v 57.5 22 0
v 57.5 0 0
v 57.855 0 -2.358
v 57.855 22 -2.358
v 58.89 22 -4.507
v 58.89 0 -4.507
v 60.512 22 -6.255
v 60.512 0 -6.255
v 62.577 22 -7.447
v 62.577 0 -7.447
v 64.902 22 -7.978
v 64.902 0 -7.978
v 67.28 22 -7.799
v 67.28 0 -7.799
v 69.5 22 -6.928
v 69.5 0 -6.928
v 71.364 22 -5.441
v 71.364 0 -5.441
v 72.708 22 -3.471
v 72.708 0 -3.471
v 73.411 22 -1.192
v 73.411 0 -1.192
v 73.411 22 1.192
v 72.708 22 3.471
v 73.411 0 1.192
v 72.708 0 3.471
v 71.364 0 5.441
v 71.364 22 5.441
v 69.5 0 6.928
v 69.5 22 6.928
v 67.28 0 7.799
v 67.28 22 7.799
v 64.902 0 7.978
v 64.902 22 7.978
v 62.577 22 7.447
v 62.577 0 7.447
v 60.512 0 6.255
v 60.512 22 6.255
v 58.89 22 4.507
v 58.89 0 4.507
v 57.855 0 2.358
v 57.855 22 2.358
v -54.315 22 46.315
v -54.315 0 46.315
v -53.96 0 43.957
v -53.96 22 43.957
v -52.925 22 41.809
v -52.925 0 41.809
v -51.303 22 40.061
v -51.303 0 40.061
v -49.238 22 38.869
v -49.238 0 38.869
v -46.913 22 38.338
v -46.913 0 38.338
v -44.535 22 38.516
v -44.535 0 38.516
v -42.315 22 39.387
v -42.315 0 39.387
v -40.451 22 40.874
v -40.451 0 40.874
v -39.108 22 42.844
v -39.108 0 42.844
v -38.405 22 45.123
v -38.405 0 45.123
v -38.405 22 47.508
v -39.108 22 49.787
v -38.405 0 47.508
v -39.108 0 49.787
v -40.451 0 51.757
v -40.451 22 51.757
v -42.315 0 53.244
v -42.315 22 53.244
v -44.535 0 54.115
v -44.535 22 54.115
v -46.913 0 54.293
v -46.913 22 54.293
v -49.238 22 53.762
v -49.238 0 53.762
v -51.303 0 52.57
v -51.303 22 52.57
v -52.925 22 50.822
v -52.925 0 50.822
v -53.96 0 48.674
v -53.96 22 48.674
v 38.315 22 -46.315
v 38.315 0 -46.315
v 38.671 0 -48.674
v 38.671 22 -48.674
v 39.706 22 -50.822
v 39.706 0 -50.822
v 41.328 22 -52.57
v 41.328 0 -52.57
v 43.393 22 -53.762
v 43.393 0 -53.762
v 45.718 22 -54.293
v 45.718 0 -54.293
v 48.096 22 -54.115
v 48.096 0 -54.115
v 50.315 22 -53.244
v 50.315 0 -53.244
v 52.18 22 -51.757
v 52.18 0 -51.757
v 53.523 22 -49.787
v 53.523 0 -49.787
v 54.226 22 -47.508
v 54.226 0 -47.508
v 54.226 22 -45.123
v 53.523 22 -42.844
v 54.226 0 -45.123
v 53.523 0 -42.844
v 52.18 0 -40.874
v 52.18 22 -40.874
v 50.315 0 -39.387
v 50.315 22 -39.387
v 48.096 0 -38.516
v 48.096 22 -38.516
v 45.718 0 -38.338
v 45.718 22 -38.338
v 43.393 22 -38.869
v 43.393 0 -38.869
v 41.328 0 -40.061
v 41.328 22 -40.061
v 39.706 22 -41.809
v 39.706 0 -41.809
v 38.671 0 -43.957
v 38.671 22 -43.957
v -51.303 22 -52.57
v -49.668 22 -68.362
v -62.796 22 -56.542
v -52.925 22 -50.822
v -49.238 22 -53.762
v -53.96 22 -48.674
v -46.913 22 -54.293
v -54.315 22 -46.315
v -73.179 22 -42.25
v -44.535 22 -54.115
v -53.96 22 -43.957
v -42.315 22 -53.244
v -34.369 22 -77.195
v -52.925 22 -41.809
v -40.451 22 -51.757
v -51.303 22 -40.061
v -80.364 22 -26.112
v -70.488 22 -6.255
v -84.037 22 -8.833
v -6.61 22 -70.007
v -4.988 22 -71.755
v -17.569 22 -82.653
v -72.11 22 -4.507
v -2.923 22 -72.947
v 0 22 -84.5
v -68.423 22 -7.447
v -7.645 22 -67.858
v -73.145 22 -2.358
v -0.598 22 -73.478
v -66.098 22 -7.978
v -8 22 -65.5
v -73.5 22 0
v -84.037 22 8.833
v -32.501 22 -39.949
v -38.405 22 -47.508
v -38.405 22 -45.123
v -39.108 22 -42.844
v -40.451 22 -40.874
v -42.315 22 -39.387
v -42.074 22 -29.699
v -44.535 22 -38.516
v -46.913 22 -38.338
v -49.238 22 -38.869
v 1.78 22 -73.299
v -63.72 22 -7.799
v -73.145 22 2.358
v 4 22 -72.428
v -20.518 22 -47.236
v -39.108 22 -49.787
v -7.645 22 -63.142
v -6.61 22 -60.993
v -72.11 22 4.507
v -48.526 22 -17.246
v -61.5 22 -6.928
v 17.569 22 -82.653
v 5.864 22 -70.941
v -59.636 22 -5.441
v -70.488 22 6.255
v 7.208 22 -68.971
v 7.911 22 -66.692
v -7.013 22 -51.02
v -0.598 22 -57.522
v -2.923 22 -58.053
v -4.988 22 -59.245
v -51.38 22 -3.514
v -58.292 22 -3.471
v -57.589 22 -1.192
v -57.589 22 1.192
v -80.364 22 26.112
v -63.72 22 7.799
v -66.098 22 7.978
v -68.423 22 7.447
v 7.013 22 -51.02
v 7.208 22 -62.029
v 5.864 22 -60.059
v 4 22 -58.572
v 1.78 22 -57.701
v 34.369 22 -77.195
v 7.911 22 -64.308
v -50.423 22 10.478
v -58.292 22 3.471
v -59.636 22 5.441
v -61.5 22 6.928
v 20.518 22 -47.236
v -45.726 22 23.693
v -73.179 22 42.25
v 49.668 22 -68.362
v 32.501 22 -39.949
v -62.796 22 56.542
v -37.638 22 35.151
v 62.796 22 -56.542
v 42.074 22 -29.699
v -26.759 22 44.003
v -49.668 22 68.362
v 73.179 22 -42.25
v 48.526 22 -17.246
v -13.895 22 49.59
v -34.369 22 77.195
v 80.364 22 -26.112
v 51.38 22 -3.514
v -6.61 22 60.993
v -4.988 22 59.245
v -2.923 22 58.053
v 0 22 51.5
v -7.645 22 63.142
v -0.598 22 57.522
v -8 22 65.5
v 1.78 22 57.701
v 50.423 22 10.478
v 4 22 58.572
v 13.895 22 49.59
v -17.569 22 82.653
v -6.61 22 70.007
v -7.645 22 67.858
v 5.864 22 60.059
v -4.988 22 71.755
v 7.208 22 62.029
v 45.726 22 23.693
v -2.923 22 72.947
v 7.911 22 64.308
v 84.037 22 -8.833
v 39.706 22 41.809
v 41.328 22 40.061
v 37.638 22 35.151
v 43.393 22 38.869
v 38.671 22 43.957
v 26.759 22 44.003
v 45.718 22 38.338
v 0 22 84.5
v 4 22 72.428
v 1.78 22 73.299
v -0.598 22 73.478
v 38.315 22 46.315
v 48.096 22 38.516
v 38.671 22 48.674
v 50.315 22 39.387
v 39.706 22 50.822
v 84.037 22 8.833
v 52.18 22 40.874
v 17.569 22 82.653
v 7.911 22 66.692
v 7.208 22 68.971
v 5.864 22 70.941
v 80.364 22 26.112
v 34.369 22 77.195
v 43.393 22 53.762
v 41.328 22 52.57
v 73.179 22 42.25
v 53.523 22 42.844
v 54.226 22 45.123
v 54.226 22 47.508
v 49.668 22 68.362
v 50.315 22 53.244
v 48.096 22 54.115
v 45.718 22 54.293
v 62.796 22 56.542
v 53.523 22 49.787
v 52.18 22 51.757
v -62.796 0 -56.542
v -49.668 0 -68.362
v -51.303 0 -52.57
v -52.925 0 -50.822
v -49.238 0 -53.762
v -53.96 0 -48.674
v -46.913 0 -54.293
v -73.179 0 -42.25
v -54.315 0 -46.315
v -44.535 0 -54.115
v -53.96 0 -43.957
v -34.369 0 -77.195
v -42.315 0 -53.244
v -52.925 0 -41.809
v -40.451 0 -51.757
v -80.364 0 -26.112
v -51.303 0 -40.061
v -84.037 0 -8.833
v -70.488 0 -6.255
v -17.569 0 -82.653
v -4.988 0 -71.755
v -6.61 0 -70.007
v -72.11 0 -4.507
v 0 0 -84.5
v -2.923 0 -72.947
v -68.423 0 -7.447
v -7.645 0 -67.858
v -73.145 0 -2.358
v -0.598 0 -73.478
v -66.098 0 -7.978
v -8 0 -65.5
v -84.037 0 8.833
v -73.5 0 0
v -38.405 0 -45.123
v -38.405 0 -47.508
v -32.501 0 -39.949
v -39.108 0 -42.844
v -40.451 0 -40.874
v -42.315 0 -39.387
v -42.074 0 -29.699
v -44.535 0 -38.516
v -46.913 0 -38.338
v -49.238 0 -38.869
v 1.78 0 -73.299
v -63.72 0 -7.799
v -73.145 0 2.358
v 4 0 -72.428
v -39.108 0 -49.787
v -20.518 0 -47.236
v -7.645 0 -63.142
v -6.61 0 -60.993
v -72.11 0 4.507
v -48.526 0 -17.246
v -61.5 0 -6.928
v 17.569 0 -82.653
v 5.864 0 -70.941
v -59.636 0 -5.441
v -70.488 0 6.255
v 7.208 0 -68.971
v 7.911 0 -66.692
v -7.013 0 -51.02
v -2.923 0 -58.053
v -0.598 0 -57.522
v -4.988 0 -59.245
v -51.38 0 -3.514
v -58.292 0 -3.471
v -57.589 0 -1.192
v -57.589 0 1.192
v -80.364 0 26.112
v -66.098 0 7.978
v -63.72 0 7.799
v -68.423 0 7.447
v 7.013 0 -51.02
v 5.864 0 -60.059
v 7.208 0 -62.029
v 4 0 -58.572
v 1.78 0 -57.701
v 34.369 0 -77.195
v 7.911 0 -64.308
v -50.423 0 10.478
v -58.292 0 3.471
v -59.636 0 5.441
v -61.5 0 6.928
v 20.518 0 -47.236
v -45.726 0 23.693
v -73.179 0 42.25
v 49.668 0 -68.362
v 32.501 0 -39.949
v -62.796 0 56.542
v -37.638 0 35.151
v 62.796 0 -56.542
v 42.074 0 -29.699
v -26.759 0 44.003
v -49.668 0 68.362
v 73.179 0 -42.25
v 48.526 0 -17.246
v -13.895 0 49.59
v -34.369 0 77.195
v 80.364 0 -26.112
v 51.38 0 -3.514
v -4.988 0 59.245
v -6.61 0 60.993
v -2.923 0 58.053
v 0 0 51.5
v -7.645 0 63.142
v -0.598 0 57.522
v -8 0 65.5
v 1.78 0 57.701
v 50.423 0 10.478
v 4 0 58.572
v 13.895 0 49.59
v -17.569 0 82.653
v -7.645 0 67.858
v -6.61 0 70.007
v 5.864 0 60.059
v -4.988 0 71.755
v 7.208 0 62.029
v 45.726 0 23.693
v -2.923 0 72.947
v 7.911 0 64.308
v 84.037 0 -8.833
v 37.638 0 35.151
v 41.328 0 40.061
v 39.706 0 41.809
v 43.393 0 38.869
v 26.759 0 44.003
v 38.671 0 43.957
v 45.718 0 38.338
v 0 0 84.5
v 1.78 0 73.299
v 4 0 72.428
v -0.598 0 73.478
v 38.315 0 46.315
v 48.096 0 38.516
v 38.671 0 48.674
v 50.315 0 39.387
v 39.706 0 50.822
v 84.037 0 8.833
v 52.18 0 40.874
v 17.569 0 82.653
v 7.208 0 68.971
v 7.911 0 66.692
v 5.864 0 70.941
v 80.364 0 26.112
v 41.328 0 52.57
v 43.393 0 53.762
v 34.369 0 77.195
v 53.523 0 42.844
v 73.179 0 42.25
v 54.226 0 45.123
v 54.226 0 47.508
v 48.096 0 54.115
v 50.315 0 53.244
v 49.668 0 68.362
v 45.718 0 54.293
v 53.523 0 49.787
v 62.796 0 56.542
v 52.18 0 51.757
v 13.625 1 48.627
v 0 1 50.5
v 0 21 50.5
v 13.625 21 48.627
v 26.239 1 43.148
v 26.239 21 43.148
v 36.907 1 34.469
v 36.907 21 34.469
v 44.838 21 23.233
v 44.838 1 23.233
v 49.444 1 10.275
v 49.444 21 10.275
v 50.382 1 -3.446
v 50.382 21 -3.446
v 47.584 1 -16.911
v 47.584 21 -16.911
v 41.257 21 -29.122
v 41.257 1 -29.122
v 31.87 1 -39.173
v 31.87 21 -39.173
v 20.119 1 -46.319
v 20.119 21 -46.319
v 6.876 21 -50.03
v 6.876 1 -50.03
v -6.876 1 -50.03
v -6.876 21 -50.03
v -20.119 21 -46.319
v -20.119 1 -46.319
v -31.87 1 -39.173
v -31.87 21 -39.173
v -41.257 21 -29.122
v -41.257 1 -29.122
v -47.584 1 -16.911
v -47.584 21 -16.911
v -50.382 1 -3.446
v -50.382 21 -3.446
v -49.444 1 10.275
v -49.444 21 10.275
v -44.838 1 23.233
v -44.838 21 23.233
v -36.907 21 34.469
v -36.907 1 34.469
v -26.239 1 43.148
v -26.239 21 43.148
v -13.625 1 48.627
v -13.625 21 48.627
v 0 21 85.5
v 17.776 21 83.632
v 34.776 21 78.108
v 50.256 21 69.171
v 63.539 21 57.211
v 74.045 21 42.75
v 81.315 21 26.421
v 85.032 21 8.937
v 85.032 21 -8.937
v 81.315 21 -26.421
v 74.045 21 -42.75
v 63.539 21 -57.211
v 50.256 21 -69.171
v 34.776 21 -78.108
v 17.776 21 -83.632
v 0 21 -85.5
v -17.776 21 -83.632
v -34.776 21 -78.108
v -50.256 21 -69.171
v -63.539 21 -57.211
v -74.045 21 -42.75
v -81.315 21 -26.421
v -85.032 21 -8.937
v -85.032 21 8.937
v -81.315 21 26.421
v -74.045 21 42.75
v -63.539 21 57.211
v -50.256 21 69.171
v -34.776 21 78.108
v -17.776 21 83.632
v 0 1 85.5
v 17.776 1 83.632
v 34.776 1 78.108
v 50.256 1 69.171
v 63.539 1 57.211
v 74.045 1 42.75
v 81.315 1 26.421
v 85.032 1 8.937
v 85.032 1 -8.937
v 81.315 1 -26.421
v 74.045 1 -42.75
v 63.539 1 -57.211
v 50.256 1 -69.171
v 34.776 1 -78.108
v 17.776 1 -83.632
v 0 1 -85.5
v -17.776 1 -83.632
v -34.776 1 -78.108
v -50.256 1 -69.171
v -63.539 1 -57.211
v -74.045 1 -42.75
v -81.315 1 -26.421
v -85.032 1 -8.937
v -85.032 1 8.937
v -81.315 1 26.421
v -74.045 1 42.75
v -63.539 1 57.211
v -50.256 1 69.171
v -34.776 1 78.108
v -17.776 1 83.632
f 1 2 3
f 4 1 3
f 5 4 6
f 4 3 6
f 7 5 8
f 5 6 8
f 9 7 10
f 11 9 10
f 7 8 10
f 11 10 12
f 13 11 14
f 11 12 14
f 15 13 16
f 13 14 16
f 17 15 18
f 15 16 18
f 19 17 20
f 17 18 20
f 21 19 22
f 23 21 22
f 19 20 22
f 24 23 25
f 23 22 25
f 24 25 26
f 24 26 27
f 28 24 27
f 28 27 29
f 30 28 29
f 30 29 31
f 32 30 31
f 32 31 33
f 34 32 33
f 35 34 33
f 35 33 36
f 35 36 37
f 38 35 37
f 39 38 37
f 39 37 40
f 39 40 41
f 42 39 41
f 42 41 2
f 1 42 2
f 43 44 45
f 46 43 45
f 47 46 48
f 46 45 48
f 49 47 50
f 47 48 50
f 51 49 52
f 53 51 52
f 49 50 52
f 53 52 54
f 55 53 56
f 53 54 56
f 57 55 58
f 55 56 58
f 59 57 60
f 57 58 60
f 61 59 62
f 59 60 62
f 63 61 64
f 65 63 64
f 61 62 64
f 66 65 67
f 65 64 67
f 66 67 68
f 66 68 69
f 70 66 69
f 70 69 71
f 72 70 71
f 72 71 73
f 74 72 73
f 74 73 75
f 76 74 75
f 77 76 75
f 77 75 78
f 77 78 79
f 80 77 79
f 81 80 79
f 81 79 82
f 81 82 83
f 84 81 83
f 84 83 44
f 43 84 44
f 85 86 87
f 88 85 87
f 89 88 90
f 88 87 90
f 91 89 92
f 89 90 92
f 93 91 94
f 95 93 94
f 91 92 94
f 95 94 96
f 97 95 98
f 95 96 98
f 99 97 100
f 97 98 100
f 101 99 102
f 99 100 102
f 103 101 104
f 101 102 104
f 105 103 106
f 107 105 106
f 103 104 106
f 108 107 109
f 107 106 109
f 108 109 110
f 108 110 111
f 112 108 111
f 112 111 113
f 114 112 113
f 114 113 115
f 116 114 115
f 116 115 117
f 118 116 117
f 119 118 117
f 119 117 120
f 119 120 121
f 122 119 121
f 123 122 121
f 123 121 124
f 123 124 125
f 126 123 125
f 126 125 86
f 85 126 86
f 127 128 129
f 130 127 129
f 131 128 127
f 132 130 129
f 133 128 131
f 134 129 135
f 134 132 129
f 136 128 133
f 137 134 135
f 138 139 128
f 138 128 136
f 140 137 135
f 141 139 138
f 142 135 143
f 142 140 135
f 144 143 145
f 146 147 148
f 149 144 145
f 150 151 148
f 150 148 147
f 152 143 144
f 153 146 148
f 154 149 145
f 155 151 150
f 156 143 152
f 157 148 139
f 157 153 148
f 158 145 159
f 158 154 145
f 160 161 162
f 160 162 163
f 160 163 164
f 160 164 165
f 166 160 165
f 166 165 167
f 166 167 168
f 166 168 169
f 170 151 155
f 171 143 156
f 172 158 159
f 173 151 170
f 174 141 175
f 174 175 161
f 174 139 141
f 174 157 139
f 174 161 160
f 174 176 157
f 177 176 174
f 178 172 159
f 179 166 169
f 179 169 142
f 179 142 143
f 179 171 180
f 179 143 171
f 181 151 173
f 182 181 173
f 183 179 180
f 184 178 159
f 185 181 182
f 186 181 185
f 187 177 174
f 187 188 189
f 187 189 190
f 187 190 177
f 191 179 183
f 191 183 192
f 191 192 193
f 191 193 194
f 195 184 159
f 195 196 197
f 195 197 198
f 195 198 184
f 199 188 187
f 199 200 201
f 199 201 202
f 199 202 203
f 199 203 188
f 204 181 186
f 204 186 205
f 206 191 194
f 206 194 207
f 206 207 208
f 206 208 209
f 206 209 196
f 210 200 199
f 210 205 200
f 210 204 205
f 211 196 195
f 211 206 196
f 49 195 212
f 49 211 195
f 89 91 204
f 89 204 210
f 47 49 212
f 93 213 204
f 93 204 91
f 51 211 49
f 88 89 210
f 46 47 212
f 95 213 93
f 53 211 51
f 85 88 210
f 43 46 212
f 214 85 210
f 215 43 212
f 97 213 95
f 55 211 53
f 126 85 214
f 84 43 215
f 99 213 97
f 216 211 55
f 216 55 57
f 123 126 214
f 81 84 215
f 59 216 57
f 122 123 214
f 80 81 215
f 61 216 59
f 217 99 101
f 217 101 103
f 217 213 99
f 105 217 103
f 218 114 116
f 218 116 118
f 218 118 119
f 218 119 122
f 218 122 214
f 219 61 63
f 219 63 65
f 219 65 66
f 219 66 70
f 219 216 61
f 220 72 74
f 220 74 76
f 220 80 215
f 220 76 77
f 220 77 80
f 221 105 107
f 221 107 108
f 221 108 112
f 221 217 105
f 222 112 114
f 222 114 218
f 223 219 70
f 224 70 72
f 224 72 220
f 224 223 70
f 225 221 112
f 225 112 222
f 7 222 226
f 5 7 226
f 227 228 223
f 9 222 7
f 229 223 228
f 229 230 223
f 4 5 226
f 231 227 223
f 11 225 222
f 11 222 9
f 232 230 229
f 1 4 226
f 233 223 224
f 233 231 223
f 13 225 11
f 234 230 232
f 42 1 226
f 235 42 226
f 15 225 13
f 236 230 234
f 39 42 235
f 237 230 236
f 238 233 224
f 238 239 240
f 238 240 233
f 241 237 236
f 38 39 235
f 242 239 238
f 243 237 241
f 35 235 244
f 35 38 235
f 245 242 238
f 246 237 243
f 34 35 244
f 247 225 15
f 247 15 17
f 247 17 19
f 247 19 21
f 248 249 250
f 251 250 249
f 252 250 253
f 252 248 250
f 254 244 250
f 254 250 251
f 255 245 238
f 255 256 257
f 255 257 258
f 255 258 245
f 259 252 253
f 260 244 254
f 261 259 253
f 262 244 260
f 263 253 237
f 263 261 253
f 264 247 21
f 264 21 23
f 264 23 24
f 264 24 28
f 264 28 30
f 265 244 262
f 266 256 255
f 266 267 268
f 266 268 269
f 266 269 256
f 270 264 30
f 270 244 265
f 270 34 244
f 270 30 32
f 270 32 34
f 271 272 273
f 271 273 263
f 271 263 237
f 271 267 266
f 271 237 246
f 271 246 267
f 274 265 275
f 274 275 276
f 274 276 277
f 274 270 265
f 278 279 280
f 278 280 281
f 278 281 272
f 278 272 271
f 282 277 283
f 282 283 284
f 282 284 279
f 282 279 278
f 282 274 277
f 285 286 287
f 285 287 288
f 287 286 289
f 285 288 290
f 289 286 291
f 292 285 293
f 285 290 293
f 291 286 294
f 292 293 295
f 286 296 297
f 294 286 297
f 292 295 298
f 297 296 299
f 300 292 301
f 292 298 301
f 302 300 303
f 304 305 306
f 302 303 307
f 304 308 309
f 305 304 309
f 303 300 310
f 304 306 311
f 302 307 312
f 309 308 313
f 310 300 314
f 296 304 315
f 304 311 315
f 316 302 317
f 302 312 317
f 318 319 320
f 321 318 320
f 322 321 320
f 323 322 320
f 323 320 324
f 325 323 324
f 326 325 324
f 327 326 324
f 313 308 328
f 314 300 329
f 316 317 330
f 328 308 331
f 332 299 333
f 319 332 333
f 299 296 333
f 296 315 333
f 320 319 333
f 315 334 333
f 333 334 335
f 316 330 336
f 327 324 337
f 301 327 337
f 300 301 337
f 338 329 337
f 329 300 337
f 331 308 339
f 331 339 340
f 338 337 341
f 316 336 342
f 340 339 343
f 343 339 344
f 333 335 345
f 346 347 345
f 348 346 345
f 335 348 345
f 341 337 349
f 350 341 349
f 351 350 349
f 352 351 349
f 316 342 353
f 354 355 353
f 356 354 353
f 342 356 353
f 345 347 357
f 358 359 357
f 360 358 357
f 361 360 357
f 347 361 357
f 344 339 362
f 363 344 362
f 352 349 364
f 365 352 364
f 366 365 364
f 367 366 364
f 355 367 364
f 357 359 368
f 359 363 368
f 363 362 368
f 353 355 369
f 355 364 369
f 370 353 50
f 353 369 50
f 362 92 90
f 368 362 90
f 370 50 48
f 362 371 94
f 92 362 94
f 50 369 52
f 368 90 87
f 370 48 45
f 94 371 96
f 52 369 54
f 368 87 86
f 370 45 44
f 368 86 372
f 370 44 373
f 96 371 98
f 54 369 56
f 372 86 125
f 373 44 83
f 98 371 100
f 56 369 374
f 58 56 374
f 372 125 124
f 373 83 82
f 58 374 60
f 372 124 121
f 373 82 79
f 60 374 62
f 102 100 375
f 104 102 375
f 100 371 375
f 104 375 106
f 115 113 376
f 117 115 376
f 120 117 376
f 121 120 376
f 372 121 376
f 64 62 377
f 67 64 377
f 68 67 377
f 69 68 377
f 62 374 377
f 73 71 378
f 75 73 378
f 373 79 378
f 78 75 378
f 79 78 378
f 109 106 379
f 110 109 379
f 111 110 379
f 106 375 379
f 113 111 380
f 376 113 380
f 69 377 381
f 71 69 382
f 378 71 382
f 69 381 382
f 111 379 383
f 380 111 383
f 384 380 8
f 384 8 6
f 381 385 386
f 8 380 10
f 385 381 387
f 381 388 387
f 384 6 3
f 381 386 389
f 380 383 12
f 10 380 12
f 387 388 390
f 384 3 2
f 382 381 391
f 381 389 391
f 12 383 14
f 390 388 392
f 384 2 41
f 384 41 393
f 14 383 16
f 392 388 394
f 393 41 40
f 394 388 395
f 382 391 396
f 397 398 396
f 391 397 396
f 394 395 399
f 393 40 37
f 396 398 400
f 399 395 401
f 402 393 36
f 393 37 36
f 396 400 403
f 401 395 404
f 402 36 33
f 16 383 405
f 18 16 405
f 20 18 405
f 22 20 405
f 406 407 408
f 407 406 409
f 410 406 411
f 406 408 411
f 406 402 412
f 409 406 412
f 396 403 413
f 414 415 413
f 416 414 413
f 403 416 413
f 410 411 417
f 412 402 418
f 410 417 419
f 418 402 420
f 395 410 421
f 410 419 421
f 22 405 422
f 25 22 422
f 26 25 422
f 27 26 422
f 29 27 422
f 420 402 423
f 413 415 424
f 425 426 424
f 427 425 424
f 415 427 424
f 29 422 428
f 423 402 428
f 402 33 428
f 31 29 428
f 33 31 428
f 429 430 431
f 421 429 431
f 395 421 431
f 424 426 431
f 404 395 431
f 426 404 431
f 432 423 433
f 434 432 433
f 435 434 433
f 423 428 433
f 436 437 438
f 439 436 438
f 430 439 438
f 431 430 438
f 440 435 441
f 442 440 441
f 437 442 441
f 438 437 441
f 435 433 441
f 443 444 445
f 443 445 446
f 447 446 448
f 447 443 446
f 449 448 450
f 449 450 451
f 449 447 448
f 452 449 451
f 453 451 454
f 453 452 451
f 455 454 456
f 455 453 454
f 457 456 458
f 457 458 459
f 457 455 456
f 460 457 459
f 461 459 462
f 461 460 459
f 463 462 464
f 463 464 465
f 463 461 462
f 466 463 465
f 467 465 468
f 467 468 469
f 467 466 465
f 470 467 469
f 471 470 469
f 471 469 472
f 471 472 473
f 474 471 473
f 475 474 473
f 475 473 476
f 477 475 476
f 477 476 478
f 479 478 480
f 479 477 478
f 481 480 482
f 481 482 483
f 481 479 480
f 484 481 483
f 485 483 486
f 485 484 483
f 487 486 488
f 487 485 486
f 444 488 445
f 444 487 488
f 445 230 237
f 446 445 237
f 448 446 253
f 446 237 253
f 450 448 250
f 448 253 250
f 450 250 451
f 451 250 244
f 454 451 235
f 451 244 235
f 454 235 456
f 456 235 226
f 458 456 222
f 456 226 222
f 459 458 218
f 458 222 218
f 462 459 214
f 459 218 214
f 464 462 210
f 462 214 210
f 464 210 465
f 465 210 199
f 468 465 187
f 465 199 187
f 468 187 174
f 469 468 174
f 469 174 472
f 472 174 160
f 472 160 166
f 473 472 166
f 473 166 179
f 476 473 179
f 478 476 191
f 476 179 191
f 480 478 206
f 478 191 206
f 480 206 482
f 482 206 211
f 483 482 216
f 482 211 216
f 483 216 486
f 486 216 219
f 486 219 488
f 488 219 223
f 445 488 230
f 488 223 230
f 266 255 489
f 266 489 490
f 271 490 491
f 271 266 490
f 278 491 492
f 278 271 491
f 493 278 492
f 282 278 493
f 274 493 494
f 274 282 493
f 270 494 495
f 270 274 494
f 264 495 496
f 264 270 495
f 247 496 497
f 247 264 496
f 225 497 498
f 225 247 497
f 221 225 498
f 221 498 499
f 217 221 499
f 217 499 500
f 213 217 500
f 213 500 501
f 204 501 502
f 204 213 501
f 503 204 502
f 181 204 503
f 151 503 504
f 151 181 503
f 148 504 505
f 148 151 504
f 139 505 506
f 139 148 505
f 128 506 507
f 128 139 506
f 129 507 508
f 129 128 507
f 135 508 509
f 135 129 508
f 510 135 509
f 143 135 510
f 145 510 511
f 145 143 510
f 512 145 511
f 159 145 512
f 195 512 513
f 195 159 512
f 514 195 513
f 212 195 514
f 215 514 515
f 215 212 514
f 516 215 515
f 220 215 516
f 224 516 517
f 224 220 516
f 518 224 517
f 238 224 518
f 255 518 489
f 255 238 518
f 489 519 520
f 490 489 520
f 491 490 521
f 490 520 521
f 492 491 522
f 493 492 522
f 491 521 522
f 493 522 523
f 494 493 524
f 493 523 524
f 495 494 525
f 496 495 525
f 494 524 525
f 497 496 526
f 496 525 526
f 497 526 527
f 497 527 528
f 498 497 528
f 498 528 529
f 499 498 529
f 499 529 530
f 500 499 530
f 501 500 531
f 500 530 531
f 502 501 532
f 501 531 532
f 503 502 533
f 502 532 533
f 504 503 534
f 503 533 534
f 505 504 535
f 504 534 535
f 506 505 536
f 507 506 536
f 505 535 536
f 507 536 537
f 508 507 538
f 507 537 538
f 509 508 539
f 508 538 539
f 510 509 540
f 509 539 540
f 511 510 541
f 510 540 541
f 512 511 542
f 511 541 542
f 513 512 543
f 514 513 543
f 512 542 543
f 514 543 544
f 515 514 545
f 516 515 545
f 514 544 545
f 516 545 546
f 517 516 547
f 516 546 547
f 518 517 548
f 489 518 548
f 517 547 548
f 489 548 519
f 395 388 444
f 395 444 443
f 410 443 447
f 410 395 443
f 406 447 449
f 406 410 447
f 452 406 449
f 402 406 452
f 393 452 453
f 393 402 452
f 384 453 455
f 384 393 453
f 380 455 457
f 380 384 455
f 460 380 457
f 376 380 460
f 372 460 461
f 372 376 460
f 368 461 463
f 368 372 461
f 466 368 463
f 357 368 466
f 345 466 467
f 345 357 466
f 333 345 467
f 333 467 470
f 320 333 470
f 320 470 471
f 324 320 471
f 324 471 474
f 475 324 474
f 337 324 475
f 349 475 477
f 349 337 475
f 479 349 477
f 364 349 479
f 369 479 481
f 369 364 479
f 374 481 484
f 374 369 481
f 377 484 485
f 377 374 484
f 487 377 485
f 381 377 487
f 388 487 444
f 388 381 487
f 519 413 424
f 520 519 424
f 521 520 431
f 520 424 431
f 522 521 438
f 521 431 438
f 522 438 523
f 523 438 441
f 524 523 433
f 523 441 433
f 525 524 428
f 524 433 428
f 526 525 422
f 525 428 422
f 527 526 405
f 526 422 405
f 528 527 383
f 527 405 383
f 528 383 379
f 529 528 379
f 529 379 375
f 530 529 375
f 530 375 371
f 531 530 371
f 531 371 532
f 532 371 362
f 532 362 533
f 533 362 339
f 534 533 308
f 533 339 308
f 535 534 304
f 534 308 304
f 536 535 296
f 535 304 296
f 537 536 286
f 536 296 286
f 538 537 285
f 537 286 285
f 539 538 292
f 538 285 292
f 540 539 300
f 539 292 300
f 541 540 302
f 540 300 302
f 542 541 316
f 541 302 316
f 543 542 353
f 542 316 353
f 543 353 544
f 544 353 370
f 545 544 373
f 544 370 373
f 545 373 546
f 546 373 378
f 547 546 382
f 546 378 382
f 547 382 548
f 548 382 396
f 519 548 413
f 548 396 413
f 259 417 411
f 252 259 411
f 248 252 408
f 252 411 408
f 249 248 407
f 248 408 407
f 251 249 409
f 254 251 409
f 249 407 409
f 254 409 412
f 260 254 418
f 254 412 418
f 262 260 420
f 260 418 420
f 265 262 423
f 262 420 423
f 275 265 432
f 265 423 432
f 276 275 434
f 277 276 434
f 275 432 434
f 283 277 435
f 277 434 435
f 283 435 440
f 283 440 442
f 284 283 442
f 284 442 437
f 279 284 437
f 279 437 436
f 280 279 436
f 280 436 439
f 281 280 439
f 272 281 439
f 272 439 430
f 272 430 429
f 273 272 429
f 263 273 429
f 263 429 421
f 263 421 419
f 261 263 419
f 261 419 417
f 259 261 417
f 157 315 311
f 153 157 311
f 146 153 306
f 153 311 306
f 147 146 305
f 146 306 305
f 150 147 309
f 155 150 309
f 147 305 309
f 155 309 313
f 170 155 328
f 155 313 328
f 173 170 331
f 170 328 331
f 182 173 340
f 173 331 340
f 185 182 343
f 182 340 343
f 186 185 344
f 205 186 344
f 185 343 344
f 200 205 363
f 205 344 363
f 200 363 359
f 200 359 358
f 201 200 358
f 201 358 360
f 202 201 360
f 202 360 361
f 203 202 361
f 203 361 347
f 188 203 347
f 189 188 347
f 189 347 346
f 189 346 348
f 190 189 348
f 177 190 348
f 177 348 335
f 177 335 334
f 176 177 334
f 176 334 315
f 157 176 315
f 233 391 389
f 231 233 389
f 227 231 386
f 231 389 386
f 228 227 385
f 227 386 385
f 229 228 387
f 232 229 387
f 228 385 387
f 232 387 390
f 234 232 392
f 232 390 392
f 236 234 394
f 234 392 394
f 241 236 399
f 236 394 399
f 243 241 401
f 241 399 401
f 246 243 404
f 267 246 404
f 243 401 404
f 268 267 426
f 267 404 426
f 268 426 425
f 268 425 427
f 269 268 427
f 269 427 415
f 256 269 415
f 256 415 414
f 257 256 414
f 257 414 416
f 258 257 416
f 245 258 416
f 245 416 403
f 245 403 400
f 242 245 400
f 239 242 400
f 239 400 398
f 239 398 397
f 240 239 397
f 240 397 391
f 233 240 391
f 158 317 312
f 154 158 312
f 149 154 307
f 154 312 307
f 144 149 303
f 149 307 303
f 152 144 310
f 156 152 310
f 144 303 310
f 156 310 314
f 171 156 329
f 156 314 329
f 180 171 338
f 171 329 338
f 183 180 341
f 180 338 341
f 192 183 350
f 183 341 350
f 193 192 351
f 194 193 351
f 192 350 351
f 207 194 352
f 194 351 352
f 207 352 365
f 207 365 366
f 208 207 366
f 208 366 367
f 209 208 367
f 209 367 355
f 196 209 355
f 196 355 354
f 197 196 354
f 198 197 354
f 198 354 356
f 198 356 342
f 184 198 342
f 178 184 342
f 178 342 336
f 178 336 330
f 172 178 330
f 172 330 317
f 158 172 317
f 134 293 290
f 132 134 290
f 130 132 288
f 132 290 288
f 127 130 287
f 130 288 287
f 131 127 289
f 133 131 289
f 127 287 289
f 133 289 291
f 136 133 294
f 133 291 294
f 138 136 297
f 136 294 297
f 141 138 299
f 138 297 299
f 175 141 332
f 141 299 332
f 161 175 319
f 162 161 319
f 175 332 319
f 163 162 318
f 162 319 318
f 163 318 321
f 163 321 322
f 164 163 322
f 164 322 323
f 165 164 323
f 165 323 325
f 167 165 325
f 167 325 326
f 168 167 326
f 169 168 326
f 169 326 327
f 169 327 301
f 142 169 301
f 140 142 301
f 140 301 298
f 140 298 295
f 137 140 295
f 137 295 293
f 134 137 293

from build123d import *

# Parameters (mm, degrees)
SKETCH_1_R      = 85.5
SKETCH_1_R_2    = 50.5
EXTRUDE_1_DEPTH = 22
CHAMFER_1_SIZE  = 1
HOLE_WIZARD_1_D = 16


with BuildPart() as part:
    # 草图1 → 凸台-拉伸1 (new body)
    with BuildSketch(Plane(origin=(0, 0, 0), x_dir=(1, 0, 0), z_dir=(0, 1, 0))):
        with Locations(Location((0, 0, 0), (0, 0, 270))):
            Circle(SKETCH_1_R)
        with Locations(Location((0, 0, 0), (0, 0, 270))):
            Circle(SKETCH_1_R_2, mode=Mode.SUBTRACT)
    extrude(amount=EXTRUDE_1_DEPTH)

    # 倒角1
    chamfer_1_edges = [part.edges().sort_by_distance(p)[0] for p in [
        (0, 0, -85.5),
        (0, 22, -85.5),
        (0, 0, -50.5),
        (0, 22, -50.5),
    ]]
    chamfer(chamfer_1_edges, length=CHAMFER_1_SIZE)

    # 孔1 (through all)
    with Locations(Plane(origin=(0, 22, 0), x_dir=(1, 0, 0), z_dir=(0, 1, 0))):
        with Locations((46.315494168, 46.315494168), (65.5, 0), (46.315494168, -46.315494168), (0, -65.5), (-46.315494168, -46.315494168), (-65.5, 0), (-46.315494168, 46.315494168), (0, 65.5)):
            Hole(HOLE_WIZARD_1_D / 2)


solid = part.part
